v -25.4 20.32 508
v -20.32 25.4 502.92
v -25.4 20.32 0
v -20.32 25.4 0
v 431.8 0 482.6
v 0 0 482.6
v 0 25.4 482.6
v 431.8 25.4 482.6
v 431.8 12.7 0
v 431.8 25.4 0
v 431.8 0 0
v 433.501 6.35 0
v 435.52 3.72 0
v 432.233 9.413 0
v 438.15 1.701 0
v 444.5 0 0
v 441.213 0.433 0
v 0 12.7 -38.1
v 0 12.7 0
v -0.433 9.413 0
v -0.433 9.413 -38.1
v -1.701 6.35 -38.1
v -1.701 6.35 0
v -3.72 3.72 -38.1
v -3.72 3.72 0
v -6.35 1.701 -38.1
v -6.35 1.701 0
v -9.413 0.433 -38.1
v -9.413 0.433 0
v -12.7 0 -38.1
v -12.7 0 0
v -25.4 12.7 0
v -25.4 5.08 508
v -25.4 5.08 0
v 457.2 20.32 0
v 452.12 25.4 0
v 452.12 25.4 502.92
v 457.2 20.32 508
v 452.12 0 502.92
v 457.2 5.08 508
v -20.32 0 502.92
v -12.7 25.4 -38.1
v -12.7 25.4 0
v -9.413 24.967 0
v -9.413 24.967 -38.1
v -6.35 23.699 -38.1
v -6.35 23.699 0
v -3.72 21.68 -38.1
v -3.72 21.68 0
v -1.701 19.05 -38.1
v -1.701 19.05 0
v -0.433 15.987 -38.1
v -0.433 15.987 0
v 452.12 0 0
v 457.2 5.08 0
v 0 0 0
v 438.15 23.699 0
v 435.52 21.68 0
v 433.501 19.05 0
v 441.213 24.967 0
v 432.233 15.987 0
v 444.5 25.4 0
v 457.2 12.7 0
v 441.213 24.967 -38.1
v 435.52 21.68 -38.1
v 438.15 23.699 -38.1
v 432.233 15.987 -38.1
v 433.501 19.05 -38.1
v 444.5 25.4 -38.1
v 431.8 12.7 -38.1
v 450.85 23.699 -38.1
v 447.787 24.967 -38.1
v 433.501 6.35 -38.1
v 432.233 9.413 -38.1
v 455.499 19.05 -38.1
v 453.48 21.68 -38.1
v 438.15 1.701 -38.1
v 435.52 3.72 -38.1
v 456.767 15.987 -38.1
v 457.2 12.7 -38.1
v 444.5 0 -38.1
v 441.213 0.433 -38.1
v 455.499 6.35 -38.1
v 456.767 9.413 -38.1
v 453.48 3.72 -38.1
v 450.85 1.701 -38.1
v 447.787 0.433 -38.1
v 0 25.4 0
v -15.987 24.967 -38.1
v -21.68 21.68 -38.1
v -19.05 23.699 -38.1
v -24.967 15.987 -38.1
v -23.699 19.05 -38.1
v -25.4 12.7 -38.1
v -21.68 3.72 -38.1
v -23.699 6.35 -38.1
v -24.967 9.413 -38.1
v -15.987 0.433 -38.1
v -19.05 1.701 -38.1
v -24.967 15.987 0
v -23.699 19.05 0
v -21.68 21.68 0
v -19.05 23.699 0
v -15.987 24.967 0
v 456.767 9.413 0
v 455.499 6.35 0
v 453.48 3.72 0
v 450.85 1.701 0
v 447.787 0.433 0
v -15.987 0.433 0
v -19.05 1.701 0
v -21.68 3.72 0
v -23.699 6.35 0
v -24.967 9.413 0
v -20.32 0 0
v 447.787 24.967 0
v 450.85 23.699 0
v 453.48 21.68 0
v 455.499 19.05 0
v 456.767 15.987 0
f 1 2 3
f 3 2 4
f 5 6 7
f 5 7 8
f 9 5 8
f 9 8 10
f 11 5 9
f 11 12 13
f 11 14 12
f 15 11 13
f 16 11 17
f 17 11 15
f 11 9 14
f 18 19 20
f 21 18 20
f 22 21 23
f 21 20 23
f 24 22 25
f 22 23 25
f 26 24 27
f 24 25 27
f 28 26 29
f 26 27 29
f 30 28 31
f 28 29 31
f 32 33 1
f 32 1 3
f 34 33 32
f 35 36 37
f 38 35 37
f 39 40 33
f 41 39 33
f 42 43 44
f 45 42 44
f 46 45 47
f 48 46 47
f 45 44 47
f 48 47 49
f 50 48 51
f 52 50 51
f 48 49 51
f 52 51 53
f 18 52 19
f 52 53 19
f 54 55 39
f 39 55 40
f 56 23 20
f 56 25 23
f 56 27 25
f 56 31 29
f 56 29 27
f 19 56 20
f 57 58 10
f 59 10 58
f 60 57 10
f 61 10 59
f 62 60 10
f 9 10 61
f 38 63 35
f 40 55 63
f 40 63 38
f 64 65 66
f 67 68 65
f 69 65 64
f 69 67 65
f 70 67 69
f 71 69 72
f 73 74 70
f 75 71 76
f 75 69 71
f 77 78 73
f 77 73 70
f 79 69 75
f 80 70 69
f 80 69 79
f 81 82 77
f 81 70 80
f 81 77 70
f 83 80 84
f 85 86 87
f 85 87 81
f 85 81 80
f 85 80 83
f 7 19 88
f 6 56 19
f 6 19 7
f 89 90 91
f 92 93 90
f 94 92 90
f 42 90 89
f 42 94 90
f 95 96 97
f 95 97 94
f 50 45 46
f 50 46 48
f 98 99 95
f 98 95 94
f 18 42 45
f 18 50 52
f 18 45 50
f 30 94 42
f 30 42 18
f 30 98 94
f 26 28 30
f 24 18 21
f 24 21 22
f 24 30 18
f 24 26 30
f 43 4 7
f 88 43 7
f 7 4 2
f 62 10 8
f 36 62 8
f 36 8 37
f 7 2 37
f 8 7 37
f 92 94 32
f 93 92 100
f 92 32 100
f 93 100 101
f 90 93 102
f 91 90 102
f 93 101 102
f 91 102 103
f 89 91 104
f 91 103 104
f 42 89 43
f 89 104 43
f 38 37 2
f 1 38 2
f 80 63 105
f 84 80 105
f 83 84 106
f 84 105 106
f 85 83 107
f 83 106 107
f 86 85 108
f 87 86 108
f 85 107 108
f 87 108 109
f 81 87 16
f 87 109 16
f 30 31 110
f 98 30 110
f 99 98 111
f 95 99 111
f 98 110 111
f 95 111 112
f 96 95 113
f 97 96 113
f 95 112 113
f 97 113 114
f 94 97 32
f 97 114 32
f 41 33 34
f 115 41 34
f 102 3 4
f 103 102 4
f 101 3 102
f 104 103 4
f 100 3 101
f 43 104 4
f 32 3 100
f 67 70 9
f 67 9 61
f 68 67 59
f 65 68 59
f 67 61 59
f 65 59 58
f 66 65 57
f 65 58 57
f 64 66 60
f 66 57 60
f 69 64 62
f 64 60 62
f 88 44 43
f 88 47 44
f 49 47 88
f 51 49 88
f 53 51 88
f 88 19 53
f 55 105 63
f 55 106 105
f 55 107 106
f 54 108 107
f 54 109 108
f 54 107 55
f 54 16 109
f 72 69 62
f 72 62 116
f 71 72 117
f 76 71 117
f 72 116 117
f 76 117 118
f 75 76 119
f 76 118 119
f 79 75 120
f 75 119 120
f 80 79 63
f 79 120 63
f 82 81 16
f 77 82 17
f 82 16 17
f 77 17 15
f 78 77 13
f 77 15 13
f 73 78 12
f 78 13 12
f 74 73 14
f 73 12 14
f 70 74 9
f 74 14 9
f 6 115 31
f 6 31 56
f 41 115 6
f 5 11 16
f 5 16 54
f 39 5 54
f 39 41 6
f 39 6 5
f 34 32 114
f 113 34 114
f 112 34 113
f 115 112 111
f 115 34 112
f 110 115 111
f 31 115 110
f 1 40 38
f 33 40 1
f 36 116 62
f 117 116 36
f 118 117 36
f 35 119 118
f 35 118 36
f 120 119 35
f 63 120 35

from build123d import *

# Parameters (mm, degrees)
F1_DEPTH = 25.4
F3_DEPTH = 38.1
F5_DEPTH = 38.1
F6_SIZE  = 5.08


with BuildPart() as f1:
    # F0 (on Front) → F1 (new body)
    with BuildSketch(Plane.XZ):
        Polygon((-25.4, 0), (0, 0), (0, 482.6), (431.8, 482.6), (431.8, 0), (457.2, 0), (457.2, 508), (-25.4, 508), align=None)
    extrude(amount=-F1_DEPTH)

    # F2 (on face) → F3 (join)
    with BuildSketch(Plane(origin=(0, 0, 0), x_dir=(1, 0, 0), z_dir=(0, 0, -1))):
        with BuildLine():
            Line((-12.7, -12.7), (-12.7, 0))
            ThreePointArc((-12.7, 0), (-21.6802561211, -3.7197438789), (-25.4, -12.7))
            Line((-25.4, -12.7), (-12.7, -12.7))
        make_face()
        with BuildLine():
            ThreePointArc((0, -12.7), (-3.7197438789, -3.7197438789), (-12.7, 0))
            Line((-12.7, 0), (-12.7, -12.7))
            Line((-12.7, -12.7), (0, -12.7))
        make_face()
        with BuildLine():
            Line((-12.7, -25.4), (-12.7, -12.7))
            Line((-12.7, -12.7), (-25.4, -12.7))
            ThreePointArc((-25.4, -12.7), (-21.6802561211, -21.6802561211), (-12.7, -25.4))
        make_face()
        with BuildLine():
            Line((0, -12.7), (-12.7, -12.7))
            Line((-12.7, -12.7), (-12.7, -25.4))
            ThreePointArc((-12.7, -25.4), (-3.7197438789, -21.6802561211), (0, -12.7))
        make_face()
    extrude(amount=F3_DEPTH)

    # F4 (on face) → F5 (join)
    with BuildSketch(Plane(origin=(0, 0, 0), x_dir=(1, 0, 0), z_dir=(0, 0, -1))):
        with BuildLine():
            Line((444.5, -12.7), (431.8, -12.7))
            ThreePointArc((431.8, -12.7), (435.5197438789, -21.6802561211), (444.5, -25.4))
            Line((444.5, -25.4), (444.5, -12.7))
        make_face()
        with BuildLine():
            ThreePointArc((444.5, 0), (435.5197438789, -3.7197438789), (431.8, -12.7))
            Line((431.8, -12.7), (444.5, -12.7))
            Line((444.5, -12.7), (444.5, 0))
        make_face()
        with BuildLine():
            Line((457.2, -12.7), (444.5, -12.7))
            Line((444.5, -12.7), (444.5, -25.4))
            ThreePointArc((444.5, -25.4), (453.4802561211, -21.6802561211), (457.2, -12.7))
        make_face()
        with BuildLine():
            Line((444.5, 0), (444.5, -12.7))
            Line((444.5, -12.7), (457.2, -12.7))
            ThreePointArc((457.2, -12.7), (453.4802561211, -3.7197438789), (444.5, 0))
        make_face()
    extrude(amount=F5_DEPTH)

    # F6
    f6_edges = [f1.edges().sort_by_distance(p)[0] for p in [
        (457.2, 25.4, 254),
        (457.2, 0, 254),
        (-25.4, 25.4, 254),
        (-25.4, 0, 254),
        (215.9, 0, 508),
        (215.9, 25.4, 508),
    ]]
    chamfer(f6_edges, length=F6_SIZE)


solid = f1.part
